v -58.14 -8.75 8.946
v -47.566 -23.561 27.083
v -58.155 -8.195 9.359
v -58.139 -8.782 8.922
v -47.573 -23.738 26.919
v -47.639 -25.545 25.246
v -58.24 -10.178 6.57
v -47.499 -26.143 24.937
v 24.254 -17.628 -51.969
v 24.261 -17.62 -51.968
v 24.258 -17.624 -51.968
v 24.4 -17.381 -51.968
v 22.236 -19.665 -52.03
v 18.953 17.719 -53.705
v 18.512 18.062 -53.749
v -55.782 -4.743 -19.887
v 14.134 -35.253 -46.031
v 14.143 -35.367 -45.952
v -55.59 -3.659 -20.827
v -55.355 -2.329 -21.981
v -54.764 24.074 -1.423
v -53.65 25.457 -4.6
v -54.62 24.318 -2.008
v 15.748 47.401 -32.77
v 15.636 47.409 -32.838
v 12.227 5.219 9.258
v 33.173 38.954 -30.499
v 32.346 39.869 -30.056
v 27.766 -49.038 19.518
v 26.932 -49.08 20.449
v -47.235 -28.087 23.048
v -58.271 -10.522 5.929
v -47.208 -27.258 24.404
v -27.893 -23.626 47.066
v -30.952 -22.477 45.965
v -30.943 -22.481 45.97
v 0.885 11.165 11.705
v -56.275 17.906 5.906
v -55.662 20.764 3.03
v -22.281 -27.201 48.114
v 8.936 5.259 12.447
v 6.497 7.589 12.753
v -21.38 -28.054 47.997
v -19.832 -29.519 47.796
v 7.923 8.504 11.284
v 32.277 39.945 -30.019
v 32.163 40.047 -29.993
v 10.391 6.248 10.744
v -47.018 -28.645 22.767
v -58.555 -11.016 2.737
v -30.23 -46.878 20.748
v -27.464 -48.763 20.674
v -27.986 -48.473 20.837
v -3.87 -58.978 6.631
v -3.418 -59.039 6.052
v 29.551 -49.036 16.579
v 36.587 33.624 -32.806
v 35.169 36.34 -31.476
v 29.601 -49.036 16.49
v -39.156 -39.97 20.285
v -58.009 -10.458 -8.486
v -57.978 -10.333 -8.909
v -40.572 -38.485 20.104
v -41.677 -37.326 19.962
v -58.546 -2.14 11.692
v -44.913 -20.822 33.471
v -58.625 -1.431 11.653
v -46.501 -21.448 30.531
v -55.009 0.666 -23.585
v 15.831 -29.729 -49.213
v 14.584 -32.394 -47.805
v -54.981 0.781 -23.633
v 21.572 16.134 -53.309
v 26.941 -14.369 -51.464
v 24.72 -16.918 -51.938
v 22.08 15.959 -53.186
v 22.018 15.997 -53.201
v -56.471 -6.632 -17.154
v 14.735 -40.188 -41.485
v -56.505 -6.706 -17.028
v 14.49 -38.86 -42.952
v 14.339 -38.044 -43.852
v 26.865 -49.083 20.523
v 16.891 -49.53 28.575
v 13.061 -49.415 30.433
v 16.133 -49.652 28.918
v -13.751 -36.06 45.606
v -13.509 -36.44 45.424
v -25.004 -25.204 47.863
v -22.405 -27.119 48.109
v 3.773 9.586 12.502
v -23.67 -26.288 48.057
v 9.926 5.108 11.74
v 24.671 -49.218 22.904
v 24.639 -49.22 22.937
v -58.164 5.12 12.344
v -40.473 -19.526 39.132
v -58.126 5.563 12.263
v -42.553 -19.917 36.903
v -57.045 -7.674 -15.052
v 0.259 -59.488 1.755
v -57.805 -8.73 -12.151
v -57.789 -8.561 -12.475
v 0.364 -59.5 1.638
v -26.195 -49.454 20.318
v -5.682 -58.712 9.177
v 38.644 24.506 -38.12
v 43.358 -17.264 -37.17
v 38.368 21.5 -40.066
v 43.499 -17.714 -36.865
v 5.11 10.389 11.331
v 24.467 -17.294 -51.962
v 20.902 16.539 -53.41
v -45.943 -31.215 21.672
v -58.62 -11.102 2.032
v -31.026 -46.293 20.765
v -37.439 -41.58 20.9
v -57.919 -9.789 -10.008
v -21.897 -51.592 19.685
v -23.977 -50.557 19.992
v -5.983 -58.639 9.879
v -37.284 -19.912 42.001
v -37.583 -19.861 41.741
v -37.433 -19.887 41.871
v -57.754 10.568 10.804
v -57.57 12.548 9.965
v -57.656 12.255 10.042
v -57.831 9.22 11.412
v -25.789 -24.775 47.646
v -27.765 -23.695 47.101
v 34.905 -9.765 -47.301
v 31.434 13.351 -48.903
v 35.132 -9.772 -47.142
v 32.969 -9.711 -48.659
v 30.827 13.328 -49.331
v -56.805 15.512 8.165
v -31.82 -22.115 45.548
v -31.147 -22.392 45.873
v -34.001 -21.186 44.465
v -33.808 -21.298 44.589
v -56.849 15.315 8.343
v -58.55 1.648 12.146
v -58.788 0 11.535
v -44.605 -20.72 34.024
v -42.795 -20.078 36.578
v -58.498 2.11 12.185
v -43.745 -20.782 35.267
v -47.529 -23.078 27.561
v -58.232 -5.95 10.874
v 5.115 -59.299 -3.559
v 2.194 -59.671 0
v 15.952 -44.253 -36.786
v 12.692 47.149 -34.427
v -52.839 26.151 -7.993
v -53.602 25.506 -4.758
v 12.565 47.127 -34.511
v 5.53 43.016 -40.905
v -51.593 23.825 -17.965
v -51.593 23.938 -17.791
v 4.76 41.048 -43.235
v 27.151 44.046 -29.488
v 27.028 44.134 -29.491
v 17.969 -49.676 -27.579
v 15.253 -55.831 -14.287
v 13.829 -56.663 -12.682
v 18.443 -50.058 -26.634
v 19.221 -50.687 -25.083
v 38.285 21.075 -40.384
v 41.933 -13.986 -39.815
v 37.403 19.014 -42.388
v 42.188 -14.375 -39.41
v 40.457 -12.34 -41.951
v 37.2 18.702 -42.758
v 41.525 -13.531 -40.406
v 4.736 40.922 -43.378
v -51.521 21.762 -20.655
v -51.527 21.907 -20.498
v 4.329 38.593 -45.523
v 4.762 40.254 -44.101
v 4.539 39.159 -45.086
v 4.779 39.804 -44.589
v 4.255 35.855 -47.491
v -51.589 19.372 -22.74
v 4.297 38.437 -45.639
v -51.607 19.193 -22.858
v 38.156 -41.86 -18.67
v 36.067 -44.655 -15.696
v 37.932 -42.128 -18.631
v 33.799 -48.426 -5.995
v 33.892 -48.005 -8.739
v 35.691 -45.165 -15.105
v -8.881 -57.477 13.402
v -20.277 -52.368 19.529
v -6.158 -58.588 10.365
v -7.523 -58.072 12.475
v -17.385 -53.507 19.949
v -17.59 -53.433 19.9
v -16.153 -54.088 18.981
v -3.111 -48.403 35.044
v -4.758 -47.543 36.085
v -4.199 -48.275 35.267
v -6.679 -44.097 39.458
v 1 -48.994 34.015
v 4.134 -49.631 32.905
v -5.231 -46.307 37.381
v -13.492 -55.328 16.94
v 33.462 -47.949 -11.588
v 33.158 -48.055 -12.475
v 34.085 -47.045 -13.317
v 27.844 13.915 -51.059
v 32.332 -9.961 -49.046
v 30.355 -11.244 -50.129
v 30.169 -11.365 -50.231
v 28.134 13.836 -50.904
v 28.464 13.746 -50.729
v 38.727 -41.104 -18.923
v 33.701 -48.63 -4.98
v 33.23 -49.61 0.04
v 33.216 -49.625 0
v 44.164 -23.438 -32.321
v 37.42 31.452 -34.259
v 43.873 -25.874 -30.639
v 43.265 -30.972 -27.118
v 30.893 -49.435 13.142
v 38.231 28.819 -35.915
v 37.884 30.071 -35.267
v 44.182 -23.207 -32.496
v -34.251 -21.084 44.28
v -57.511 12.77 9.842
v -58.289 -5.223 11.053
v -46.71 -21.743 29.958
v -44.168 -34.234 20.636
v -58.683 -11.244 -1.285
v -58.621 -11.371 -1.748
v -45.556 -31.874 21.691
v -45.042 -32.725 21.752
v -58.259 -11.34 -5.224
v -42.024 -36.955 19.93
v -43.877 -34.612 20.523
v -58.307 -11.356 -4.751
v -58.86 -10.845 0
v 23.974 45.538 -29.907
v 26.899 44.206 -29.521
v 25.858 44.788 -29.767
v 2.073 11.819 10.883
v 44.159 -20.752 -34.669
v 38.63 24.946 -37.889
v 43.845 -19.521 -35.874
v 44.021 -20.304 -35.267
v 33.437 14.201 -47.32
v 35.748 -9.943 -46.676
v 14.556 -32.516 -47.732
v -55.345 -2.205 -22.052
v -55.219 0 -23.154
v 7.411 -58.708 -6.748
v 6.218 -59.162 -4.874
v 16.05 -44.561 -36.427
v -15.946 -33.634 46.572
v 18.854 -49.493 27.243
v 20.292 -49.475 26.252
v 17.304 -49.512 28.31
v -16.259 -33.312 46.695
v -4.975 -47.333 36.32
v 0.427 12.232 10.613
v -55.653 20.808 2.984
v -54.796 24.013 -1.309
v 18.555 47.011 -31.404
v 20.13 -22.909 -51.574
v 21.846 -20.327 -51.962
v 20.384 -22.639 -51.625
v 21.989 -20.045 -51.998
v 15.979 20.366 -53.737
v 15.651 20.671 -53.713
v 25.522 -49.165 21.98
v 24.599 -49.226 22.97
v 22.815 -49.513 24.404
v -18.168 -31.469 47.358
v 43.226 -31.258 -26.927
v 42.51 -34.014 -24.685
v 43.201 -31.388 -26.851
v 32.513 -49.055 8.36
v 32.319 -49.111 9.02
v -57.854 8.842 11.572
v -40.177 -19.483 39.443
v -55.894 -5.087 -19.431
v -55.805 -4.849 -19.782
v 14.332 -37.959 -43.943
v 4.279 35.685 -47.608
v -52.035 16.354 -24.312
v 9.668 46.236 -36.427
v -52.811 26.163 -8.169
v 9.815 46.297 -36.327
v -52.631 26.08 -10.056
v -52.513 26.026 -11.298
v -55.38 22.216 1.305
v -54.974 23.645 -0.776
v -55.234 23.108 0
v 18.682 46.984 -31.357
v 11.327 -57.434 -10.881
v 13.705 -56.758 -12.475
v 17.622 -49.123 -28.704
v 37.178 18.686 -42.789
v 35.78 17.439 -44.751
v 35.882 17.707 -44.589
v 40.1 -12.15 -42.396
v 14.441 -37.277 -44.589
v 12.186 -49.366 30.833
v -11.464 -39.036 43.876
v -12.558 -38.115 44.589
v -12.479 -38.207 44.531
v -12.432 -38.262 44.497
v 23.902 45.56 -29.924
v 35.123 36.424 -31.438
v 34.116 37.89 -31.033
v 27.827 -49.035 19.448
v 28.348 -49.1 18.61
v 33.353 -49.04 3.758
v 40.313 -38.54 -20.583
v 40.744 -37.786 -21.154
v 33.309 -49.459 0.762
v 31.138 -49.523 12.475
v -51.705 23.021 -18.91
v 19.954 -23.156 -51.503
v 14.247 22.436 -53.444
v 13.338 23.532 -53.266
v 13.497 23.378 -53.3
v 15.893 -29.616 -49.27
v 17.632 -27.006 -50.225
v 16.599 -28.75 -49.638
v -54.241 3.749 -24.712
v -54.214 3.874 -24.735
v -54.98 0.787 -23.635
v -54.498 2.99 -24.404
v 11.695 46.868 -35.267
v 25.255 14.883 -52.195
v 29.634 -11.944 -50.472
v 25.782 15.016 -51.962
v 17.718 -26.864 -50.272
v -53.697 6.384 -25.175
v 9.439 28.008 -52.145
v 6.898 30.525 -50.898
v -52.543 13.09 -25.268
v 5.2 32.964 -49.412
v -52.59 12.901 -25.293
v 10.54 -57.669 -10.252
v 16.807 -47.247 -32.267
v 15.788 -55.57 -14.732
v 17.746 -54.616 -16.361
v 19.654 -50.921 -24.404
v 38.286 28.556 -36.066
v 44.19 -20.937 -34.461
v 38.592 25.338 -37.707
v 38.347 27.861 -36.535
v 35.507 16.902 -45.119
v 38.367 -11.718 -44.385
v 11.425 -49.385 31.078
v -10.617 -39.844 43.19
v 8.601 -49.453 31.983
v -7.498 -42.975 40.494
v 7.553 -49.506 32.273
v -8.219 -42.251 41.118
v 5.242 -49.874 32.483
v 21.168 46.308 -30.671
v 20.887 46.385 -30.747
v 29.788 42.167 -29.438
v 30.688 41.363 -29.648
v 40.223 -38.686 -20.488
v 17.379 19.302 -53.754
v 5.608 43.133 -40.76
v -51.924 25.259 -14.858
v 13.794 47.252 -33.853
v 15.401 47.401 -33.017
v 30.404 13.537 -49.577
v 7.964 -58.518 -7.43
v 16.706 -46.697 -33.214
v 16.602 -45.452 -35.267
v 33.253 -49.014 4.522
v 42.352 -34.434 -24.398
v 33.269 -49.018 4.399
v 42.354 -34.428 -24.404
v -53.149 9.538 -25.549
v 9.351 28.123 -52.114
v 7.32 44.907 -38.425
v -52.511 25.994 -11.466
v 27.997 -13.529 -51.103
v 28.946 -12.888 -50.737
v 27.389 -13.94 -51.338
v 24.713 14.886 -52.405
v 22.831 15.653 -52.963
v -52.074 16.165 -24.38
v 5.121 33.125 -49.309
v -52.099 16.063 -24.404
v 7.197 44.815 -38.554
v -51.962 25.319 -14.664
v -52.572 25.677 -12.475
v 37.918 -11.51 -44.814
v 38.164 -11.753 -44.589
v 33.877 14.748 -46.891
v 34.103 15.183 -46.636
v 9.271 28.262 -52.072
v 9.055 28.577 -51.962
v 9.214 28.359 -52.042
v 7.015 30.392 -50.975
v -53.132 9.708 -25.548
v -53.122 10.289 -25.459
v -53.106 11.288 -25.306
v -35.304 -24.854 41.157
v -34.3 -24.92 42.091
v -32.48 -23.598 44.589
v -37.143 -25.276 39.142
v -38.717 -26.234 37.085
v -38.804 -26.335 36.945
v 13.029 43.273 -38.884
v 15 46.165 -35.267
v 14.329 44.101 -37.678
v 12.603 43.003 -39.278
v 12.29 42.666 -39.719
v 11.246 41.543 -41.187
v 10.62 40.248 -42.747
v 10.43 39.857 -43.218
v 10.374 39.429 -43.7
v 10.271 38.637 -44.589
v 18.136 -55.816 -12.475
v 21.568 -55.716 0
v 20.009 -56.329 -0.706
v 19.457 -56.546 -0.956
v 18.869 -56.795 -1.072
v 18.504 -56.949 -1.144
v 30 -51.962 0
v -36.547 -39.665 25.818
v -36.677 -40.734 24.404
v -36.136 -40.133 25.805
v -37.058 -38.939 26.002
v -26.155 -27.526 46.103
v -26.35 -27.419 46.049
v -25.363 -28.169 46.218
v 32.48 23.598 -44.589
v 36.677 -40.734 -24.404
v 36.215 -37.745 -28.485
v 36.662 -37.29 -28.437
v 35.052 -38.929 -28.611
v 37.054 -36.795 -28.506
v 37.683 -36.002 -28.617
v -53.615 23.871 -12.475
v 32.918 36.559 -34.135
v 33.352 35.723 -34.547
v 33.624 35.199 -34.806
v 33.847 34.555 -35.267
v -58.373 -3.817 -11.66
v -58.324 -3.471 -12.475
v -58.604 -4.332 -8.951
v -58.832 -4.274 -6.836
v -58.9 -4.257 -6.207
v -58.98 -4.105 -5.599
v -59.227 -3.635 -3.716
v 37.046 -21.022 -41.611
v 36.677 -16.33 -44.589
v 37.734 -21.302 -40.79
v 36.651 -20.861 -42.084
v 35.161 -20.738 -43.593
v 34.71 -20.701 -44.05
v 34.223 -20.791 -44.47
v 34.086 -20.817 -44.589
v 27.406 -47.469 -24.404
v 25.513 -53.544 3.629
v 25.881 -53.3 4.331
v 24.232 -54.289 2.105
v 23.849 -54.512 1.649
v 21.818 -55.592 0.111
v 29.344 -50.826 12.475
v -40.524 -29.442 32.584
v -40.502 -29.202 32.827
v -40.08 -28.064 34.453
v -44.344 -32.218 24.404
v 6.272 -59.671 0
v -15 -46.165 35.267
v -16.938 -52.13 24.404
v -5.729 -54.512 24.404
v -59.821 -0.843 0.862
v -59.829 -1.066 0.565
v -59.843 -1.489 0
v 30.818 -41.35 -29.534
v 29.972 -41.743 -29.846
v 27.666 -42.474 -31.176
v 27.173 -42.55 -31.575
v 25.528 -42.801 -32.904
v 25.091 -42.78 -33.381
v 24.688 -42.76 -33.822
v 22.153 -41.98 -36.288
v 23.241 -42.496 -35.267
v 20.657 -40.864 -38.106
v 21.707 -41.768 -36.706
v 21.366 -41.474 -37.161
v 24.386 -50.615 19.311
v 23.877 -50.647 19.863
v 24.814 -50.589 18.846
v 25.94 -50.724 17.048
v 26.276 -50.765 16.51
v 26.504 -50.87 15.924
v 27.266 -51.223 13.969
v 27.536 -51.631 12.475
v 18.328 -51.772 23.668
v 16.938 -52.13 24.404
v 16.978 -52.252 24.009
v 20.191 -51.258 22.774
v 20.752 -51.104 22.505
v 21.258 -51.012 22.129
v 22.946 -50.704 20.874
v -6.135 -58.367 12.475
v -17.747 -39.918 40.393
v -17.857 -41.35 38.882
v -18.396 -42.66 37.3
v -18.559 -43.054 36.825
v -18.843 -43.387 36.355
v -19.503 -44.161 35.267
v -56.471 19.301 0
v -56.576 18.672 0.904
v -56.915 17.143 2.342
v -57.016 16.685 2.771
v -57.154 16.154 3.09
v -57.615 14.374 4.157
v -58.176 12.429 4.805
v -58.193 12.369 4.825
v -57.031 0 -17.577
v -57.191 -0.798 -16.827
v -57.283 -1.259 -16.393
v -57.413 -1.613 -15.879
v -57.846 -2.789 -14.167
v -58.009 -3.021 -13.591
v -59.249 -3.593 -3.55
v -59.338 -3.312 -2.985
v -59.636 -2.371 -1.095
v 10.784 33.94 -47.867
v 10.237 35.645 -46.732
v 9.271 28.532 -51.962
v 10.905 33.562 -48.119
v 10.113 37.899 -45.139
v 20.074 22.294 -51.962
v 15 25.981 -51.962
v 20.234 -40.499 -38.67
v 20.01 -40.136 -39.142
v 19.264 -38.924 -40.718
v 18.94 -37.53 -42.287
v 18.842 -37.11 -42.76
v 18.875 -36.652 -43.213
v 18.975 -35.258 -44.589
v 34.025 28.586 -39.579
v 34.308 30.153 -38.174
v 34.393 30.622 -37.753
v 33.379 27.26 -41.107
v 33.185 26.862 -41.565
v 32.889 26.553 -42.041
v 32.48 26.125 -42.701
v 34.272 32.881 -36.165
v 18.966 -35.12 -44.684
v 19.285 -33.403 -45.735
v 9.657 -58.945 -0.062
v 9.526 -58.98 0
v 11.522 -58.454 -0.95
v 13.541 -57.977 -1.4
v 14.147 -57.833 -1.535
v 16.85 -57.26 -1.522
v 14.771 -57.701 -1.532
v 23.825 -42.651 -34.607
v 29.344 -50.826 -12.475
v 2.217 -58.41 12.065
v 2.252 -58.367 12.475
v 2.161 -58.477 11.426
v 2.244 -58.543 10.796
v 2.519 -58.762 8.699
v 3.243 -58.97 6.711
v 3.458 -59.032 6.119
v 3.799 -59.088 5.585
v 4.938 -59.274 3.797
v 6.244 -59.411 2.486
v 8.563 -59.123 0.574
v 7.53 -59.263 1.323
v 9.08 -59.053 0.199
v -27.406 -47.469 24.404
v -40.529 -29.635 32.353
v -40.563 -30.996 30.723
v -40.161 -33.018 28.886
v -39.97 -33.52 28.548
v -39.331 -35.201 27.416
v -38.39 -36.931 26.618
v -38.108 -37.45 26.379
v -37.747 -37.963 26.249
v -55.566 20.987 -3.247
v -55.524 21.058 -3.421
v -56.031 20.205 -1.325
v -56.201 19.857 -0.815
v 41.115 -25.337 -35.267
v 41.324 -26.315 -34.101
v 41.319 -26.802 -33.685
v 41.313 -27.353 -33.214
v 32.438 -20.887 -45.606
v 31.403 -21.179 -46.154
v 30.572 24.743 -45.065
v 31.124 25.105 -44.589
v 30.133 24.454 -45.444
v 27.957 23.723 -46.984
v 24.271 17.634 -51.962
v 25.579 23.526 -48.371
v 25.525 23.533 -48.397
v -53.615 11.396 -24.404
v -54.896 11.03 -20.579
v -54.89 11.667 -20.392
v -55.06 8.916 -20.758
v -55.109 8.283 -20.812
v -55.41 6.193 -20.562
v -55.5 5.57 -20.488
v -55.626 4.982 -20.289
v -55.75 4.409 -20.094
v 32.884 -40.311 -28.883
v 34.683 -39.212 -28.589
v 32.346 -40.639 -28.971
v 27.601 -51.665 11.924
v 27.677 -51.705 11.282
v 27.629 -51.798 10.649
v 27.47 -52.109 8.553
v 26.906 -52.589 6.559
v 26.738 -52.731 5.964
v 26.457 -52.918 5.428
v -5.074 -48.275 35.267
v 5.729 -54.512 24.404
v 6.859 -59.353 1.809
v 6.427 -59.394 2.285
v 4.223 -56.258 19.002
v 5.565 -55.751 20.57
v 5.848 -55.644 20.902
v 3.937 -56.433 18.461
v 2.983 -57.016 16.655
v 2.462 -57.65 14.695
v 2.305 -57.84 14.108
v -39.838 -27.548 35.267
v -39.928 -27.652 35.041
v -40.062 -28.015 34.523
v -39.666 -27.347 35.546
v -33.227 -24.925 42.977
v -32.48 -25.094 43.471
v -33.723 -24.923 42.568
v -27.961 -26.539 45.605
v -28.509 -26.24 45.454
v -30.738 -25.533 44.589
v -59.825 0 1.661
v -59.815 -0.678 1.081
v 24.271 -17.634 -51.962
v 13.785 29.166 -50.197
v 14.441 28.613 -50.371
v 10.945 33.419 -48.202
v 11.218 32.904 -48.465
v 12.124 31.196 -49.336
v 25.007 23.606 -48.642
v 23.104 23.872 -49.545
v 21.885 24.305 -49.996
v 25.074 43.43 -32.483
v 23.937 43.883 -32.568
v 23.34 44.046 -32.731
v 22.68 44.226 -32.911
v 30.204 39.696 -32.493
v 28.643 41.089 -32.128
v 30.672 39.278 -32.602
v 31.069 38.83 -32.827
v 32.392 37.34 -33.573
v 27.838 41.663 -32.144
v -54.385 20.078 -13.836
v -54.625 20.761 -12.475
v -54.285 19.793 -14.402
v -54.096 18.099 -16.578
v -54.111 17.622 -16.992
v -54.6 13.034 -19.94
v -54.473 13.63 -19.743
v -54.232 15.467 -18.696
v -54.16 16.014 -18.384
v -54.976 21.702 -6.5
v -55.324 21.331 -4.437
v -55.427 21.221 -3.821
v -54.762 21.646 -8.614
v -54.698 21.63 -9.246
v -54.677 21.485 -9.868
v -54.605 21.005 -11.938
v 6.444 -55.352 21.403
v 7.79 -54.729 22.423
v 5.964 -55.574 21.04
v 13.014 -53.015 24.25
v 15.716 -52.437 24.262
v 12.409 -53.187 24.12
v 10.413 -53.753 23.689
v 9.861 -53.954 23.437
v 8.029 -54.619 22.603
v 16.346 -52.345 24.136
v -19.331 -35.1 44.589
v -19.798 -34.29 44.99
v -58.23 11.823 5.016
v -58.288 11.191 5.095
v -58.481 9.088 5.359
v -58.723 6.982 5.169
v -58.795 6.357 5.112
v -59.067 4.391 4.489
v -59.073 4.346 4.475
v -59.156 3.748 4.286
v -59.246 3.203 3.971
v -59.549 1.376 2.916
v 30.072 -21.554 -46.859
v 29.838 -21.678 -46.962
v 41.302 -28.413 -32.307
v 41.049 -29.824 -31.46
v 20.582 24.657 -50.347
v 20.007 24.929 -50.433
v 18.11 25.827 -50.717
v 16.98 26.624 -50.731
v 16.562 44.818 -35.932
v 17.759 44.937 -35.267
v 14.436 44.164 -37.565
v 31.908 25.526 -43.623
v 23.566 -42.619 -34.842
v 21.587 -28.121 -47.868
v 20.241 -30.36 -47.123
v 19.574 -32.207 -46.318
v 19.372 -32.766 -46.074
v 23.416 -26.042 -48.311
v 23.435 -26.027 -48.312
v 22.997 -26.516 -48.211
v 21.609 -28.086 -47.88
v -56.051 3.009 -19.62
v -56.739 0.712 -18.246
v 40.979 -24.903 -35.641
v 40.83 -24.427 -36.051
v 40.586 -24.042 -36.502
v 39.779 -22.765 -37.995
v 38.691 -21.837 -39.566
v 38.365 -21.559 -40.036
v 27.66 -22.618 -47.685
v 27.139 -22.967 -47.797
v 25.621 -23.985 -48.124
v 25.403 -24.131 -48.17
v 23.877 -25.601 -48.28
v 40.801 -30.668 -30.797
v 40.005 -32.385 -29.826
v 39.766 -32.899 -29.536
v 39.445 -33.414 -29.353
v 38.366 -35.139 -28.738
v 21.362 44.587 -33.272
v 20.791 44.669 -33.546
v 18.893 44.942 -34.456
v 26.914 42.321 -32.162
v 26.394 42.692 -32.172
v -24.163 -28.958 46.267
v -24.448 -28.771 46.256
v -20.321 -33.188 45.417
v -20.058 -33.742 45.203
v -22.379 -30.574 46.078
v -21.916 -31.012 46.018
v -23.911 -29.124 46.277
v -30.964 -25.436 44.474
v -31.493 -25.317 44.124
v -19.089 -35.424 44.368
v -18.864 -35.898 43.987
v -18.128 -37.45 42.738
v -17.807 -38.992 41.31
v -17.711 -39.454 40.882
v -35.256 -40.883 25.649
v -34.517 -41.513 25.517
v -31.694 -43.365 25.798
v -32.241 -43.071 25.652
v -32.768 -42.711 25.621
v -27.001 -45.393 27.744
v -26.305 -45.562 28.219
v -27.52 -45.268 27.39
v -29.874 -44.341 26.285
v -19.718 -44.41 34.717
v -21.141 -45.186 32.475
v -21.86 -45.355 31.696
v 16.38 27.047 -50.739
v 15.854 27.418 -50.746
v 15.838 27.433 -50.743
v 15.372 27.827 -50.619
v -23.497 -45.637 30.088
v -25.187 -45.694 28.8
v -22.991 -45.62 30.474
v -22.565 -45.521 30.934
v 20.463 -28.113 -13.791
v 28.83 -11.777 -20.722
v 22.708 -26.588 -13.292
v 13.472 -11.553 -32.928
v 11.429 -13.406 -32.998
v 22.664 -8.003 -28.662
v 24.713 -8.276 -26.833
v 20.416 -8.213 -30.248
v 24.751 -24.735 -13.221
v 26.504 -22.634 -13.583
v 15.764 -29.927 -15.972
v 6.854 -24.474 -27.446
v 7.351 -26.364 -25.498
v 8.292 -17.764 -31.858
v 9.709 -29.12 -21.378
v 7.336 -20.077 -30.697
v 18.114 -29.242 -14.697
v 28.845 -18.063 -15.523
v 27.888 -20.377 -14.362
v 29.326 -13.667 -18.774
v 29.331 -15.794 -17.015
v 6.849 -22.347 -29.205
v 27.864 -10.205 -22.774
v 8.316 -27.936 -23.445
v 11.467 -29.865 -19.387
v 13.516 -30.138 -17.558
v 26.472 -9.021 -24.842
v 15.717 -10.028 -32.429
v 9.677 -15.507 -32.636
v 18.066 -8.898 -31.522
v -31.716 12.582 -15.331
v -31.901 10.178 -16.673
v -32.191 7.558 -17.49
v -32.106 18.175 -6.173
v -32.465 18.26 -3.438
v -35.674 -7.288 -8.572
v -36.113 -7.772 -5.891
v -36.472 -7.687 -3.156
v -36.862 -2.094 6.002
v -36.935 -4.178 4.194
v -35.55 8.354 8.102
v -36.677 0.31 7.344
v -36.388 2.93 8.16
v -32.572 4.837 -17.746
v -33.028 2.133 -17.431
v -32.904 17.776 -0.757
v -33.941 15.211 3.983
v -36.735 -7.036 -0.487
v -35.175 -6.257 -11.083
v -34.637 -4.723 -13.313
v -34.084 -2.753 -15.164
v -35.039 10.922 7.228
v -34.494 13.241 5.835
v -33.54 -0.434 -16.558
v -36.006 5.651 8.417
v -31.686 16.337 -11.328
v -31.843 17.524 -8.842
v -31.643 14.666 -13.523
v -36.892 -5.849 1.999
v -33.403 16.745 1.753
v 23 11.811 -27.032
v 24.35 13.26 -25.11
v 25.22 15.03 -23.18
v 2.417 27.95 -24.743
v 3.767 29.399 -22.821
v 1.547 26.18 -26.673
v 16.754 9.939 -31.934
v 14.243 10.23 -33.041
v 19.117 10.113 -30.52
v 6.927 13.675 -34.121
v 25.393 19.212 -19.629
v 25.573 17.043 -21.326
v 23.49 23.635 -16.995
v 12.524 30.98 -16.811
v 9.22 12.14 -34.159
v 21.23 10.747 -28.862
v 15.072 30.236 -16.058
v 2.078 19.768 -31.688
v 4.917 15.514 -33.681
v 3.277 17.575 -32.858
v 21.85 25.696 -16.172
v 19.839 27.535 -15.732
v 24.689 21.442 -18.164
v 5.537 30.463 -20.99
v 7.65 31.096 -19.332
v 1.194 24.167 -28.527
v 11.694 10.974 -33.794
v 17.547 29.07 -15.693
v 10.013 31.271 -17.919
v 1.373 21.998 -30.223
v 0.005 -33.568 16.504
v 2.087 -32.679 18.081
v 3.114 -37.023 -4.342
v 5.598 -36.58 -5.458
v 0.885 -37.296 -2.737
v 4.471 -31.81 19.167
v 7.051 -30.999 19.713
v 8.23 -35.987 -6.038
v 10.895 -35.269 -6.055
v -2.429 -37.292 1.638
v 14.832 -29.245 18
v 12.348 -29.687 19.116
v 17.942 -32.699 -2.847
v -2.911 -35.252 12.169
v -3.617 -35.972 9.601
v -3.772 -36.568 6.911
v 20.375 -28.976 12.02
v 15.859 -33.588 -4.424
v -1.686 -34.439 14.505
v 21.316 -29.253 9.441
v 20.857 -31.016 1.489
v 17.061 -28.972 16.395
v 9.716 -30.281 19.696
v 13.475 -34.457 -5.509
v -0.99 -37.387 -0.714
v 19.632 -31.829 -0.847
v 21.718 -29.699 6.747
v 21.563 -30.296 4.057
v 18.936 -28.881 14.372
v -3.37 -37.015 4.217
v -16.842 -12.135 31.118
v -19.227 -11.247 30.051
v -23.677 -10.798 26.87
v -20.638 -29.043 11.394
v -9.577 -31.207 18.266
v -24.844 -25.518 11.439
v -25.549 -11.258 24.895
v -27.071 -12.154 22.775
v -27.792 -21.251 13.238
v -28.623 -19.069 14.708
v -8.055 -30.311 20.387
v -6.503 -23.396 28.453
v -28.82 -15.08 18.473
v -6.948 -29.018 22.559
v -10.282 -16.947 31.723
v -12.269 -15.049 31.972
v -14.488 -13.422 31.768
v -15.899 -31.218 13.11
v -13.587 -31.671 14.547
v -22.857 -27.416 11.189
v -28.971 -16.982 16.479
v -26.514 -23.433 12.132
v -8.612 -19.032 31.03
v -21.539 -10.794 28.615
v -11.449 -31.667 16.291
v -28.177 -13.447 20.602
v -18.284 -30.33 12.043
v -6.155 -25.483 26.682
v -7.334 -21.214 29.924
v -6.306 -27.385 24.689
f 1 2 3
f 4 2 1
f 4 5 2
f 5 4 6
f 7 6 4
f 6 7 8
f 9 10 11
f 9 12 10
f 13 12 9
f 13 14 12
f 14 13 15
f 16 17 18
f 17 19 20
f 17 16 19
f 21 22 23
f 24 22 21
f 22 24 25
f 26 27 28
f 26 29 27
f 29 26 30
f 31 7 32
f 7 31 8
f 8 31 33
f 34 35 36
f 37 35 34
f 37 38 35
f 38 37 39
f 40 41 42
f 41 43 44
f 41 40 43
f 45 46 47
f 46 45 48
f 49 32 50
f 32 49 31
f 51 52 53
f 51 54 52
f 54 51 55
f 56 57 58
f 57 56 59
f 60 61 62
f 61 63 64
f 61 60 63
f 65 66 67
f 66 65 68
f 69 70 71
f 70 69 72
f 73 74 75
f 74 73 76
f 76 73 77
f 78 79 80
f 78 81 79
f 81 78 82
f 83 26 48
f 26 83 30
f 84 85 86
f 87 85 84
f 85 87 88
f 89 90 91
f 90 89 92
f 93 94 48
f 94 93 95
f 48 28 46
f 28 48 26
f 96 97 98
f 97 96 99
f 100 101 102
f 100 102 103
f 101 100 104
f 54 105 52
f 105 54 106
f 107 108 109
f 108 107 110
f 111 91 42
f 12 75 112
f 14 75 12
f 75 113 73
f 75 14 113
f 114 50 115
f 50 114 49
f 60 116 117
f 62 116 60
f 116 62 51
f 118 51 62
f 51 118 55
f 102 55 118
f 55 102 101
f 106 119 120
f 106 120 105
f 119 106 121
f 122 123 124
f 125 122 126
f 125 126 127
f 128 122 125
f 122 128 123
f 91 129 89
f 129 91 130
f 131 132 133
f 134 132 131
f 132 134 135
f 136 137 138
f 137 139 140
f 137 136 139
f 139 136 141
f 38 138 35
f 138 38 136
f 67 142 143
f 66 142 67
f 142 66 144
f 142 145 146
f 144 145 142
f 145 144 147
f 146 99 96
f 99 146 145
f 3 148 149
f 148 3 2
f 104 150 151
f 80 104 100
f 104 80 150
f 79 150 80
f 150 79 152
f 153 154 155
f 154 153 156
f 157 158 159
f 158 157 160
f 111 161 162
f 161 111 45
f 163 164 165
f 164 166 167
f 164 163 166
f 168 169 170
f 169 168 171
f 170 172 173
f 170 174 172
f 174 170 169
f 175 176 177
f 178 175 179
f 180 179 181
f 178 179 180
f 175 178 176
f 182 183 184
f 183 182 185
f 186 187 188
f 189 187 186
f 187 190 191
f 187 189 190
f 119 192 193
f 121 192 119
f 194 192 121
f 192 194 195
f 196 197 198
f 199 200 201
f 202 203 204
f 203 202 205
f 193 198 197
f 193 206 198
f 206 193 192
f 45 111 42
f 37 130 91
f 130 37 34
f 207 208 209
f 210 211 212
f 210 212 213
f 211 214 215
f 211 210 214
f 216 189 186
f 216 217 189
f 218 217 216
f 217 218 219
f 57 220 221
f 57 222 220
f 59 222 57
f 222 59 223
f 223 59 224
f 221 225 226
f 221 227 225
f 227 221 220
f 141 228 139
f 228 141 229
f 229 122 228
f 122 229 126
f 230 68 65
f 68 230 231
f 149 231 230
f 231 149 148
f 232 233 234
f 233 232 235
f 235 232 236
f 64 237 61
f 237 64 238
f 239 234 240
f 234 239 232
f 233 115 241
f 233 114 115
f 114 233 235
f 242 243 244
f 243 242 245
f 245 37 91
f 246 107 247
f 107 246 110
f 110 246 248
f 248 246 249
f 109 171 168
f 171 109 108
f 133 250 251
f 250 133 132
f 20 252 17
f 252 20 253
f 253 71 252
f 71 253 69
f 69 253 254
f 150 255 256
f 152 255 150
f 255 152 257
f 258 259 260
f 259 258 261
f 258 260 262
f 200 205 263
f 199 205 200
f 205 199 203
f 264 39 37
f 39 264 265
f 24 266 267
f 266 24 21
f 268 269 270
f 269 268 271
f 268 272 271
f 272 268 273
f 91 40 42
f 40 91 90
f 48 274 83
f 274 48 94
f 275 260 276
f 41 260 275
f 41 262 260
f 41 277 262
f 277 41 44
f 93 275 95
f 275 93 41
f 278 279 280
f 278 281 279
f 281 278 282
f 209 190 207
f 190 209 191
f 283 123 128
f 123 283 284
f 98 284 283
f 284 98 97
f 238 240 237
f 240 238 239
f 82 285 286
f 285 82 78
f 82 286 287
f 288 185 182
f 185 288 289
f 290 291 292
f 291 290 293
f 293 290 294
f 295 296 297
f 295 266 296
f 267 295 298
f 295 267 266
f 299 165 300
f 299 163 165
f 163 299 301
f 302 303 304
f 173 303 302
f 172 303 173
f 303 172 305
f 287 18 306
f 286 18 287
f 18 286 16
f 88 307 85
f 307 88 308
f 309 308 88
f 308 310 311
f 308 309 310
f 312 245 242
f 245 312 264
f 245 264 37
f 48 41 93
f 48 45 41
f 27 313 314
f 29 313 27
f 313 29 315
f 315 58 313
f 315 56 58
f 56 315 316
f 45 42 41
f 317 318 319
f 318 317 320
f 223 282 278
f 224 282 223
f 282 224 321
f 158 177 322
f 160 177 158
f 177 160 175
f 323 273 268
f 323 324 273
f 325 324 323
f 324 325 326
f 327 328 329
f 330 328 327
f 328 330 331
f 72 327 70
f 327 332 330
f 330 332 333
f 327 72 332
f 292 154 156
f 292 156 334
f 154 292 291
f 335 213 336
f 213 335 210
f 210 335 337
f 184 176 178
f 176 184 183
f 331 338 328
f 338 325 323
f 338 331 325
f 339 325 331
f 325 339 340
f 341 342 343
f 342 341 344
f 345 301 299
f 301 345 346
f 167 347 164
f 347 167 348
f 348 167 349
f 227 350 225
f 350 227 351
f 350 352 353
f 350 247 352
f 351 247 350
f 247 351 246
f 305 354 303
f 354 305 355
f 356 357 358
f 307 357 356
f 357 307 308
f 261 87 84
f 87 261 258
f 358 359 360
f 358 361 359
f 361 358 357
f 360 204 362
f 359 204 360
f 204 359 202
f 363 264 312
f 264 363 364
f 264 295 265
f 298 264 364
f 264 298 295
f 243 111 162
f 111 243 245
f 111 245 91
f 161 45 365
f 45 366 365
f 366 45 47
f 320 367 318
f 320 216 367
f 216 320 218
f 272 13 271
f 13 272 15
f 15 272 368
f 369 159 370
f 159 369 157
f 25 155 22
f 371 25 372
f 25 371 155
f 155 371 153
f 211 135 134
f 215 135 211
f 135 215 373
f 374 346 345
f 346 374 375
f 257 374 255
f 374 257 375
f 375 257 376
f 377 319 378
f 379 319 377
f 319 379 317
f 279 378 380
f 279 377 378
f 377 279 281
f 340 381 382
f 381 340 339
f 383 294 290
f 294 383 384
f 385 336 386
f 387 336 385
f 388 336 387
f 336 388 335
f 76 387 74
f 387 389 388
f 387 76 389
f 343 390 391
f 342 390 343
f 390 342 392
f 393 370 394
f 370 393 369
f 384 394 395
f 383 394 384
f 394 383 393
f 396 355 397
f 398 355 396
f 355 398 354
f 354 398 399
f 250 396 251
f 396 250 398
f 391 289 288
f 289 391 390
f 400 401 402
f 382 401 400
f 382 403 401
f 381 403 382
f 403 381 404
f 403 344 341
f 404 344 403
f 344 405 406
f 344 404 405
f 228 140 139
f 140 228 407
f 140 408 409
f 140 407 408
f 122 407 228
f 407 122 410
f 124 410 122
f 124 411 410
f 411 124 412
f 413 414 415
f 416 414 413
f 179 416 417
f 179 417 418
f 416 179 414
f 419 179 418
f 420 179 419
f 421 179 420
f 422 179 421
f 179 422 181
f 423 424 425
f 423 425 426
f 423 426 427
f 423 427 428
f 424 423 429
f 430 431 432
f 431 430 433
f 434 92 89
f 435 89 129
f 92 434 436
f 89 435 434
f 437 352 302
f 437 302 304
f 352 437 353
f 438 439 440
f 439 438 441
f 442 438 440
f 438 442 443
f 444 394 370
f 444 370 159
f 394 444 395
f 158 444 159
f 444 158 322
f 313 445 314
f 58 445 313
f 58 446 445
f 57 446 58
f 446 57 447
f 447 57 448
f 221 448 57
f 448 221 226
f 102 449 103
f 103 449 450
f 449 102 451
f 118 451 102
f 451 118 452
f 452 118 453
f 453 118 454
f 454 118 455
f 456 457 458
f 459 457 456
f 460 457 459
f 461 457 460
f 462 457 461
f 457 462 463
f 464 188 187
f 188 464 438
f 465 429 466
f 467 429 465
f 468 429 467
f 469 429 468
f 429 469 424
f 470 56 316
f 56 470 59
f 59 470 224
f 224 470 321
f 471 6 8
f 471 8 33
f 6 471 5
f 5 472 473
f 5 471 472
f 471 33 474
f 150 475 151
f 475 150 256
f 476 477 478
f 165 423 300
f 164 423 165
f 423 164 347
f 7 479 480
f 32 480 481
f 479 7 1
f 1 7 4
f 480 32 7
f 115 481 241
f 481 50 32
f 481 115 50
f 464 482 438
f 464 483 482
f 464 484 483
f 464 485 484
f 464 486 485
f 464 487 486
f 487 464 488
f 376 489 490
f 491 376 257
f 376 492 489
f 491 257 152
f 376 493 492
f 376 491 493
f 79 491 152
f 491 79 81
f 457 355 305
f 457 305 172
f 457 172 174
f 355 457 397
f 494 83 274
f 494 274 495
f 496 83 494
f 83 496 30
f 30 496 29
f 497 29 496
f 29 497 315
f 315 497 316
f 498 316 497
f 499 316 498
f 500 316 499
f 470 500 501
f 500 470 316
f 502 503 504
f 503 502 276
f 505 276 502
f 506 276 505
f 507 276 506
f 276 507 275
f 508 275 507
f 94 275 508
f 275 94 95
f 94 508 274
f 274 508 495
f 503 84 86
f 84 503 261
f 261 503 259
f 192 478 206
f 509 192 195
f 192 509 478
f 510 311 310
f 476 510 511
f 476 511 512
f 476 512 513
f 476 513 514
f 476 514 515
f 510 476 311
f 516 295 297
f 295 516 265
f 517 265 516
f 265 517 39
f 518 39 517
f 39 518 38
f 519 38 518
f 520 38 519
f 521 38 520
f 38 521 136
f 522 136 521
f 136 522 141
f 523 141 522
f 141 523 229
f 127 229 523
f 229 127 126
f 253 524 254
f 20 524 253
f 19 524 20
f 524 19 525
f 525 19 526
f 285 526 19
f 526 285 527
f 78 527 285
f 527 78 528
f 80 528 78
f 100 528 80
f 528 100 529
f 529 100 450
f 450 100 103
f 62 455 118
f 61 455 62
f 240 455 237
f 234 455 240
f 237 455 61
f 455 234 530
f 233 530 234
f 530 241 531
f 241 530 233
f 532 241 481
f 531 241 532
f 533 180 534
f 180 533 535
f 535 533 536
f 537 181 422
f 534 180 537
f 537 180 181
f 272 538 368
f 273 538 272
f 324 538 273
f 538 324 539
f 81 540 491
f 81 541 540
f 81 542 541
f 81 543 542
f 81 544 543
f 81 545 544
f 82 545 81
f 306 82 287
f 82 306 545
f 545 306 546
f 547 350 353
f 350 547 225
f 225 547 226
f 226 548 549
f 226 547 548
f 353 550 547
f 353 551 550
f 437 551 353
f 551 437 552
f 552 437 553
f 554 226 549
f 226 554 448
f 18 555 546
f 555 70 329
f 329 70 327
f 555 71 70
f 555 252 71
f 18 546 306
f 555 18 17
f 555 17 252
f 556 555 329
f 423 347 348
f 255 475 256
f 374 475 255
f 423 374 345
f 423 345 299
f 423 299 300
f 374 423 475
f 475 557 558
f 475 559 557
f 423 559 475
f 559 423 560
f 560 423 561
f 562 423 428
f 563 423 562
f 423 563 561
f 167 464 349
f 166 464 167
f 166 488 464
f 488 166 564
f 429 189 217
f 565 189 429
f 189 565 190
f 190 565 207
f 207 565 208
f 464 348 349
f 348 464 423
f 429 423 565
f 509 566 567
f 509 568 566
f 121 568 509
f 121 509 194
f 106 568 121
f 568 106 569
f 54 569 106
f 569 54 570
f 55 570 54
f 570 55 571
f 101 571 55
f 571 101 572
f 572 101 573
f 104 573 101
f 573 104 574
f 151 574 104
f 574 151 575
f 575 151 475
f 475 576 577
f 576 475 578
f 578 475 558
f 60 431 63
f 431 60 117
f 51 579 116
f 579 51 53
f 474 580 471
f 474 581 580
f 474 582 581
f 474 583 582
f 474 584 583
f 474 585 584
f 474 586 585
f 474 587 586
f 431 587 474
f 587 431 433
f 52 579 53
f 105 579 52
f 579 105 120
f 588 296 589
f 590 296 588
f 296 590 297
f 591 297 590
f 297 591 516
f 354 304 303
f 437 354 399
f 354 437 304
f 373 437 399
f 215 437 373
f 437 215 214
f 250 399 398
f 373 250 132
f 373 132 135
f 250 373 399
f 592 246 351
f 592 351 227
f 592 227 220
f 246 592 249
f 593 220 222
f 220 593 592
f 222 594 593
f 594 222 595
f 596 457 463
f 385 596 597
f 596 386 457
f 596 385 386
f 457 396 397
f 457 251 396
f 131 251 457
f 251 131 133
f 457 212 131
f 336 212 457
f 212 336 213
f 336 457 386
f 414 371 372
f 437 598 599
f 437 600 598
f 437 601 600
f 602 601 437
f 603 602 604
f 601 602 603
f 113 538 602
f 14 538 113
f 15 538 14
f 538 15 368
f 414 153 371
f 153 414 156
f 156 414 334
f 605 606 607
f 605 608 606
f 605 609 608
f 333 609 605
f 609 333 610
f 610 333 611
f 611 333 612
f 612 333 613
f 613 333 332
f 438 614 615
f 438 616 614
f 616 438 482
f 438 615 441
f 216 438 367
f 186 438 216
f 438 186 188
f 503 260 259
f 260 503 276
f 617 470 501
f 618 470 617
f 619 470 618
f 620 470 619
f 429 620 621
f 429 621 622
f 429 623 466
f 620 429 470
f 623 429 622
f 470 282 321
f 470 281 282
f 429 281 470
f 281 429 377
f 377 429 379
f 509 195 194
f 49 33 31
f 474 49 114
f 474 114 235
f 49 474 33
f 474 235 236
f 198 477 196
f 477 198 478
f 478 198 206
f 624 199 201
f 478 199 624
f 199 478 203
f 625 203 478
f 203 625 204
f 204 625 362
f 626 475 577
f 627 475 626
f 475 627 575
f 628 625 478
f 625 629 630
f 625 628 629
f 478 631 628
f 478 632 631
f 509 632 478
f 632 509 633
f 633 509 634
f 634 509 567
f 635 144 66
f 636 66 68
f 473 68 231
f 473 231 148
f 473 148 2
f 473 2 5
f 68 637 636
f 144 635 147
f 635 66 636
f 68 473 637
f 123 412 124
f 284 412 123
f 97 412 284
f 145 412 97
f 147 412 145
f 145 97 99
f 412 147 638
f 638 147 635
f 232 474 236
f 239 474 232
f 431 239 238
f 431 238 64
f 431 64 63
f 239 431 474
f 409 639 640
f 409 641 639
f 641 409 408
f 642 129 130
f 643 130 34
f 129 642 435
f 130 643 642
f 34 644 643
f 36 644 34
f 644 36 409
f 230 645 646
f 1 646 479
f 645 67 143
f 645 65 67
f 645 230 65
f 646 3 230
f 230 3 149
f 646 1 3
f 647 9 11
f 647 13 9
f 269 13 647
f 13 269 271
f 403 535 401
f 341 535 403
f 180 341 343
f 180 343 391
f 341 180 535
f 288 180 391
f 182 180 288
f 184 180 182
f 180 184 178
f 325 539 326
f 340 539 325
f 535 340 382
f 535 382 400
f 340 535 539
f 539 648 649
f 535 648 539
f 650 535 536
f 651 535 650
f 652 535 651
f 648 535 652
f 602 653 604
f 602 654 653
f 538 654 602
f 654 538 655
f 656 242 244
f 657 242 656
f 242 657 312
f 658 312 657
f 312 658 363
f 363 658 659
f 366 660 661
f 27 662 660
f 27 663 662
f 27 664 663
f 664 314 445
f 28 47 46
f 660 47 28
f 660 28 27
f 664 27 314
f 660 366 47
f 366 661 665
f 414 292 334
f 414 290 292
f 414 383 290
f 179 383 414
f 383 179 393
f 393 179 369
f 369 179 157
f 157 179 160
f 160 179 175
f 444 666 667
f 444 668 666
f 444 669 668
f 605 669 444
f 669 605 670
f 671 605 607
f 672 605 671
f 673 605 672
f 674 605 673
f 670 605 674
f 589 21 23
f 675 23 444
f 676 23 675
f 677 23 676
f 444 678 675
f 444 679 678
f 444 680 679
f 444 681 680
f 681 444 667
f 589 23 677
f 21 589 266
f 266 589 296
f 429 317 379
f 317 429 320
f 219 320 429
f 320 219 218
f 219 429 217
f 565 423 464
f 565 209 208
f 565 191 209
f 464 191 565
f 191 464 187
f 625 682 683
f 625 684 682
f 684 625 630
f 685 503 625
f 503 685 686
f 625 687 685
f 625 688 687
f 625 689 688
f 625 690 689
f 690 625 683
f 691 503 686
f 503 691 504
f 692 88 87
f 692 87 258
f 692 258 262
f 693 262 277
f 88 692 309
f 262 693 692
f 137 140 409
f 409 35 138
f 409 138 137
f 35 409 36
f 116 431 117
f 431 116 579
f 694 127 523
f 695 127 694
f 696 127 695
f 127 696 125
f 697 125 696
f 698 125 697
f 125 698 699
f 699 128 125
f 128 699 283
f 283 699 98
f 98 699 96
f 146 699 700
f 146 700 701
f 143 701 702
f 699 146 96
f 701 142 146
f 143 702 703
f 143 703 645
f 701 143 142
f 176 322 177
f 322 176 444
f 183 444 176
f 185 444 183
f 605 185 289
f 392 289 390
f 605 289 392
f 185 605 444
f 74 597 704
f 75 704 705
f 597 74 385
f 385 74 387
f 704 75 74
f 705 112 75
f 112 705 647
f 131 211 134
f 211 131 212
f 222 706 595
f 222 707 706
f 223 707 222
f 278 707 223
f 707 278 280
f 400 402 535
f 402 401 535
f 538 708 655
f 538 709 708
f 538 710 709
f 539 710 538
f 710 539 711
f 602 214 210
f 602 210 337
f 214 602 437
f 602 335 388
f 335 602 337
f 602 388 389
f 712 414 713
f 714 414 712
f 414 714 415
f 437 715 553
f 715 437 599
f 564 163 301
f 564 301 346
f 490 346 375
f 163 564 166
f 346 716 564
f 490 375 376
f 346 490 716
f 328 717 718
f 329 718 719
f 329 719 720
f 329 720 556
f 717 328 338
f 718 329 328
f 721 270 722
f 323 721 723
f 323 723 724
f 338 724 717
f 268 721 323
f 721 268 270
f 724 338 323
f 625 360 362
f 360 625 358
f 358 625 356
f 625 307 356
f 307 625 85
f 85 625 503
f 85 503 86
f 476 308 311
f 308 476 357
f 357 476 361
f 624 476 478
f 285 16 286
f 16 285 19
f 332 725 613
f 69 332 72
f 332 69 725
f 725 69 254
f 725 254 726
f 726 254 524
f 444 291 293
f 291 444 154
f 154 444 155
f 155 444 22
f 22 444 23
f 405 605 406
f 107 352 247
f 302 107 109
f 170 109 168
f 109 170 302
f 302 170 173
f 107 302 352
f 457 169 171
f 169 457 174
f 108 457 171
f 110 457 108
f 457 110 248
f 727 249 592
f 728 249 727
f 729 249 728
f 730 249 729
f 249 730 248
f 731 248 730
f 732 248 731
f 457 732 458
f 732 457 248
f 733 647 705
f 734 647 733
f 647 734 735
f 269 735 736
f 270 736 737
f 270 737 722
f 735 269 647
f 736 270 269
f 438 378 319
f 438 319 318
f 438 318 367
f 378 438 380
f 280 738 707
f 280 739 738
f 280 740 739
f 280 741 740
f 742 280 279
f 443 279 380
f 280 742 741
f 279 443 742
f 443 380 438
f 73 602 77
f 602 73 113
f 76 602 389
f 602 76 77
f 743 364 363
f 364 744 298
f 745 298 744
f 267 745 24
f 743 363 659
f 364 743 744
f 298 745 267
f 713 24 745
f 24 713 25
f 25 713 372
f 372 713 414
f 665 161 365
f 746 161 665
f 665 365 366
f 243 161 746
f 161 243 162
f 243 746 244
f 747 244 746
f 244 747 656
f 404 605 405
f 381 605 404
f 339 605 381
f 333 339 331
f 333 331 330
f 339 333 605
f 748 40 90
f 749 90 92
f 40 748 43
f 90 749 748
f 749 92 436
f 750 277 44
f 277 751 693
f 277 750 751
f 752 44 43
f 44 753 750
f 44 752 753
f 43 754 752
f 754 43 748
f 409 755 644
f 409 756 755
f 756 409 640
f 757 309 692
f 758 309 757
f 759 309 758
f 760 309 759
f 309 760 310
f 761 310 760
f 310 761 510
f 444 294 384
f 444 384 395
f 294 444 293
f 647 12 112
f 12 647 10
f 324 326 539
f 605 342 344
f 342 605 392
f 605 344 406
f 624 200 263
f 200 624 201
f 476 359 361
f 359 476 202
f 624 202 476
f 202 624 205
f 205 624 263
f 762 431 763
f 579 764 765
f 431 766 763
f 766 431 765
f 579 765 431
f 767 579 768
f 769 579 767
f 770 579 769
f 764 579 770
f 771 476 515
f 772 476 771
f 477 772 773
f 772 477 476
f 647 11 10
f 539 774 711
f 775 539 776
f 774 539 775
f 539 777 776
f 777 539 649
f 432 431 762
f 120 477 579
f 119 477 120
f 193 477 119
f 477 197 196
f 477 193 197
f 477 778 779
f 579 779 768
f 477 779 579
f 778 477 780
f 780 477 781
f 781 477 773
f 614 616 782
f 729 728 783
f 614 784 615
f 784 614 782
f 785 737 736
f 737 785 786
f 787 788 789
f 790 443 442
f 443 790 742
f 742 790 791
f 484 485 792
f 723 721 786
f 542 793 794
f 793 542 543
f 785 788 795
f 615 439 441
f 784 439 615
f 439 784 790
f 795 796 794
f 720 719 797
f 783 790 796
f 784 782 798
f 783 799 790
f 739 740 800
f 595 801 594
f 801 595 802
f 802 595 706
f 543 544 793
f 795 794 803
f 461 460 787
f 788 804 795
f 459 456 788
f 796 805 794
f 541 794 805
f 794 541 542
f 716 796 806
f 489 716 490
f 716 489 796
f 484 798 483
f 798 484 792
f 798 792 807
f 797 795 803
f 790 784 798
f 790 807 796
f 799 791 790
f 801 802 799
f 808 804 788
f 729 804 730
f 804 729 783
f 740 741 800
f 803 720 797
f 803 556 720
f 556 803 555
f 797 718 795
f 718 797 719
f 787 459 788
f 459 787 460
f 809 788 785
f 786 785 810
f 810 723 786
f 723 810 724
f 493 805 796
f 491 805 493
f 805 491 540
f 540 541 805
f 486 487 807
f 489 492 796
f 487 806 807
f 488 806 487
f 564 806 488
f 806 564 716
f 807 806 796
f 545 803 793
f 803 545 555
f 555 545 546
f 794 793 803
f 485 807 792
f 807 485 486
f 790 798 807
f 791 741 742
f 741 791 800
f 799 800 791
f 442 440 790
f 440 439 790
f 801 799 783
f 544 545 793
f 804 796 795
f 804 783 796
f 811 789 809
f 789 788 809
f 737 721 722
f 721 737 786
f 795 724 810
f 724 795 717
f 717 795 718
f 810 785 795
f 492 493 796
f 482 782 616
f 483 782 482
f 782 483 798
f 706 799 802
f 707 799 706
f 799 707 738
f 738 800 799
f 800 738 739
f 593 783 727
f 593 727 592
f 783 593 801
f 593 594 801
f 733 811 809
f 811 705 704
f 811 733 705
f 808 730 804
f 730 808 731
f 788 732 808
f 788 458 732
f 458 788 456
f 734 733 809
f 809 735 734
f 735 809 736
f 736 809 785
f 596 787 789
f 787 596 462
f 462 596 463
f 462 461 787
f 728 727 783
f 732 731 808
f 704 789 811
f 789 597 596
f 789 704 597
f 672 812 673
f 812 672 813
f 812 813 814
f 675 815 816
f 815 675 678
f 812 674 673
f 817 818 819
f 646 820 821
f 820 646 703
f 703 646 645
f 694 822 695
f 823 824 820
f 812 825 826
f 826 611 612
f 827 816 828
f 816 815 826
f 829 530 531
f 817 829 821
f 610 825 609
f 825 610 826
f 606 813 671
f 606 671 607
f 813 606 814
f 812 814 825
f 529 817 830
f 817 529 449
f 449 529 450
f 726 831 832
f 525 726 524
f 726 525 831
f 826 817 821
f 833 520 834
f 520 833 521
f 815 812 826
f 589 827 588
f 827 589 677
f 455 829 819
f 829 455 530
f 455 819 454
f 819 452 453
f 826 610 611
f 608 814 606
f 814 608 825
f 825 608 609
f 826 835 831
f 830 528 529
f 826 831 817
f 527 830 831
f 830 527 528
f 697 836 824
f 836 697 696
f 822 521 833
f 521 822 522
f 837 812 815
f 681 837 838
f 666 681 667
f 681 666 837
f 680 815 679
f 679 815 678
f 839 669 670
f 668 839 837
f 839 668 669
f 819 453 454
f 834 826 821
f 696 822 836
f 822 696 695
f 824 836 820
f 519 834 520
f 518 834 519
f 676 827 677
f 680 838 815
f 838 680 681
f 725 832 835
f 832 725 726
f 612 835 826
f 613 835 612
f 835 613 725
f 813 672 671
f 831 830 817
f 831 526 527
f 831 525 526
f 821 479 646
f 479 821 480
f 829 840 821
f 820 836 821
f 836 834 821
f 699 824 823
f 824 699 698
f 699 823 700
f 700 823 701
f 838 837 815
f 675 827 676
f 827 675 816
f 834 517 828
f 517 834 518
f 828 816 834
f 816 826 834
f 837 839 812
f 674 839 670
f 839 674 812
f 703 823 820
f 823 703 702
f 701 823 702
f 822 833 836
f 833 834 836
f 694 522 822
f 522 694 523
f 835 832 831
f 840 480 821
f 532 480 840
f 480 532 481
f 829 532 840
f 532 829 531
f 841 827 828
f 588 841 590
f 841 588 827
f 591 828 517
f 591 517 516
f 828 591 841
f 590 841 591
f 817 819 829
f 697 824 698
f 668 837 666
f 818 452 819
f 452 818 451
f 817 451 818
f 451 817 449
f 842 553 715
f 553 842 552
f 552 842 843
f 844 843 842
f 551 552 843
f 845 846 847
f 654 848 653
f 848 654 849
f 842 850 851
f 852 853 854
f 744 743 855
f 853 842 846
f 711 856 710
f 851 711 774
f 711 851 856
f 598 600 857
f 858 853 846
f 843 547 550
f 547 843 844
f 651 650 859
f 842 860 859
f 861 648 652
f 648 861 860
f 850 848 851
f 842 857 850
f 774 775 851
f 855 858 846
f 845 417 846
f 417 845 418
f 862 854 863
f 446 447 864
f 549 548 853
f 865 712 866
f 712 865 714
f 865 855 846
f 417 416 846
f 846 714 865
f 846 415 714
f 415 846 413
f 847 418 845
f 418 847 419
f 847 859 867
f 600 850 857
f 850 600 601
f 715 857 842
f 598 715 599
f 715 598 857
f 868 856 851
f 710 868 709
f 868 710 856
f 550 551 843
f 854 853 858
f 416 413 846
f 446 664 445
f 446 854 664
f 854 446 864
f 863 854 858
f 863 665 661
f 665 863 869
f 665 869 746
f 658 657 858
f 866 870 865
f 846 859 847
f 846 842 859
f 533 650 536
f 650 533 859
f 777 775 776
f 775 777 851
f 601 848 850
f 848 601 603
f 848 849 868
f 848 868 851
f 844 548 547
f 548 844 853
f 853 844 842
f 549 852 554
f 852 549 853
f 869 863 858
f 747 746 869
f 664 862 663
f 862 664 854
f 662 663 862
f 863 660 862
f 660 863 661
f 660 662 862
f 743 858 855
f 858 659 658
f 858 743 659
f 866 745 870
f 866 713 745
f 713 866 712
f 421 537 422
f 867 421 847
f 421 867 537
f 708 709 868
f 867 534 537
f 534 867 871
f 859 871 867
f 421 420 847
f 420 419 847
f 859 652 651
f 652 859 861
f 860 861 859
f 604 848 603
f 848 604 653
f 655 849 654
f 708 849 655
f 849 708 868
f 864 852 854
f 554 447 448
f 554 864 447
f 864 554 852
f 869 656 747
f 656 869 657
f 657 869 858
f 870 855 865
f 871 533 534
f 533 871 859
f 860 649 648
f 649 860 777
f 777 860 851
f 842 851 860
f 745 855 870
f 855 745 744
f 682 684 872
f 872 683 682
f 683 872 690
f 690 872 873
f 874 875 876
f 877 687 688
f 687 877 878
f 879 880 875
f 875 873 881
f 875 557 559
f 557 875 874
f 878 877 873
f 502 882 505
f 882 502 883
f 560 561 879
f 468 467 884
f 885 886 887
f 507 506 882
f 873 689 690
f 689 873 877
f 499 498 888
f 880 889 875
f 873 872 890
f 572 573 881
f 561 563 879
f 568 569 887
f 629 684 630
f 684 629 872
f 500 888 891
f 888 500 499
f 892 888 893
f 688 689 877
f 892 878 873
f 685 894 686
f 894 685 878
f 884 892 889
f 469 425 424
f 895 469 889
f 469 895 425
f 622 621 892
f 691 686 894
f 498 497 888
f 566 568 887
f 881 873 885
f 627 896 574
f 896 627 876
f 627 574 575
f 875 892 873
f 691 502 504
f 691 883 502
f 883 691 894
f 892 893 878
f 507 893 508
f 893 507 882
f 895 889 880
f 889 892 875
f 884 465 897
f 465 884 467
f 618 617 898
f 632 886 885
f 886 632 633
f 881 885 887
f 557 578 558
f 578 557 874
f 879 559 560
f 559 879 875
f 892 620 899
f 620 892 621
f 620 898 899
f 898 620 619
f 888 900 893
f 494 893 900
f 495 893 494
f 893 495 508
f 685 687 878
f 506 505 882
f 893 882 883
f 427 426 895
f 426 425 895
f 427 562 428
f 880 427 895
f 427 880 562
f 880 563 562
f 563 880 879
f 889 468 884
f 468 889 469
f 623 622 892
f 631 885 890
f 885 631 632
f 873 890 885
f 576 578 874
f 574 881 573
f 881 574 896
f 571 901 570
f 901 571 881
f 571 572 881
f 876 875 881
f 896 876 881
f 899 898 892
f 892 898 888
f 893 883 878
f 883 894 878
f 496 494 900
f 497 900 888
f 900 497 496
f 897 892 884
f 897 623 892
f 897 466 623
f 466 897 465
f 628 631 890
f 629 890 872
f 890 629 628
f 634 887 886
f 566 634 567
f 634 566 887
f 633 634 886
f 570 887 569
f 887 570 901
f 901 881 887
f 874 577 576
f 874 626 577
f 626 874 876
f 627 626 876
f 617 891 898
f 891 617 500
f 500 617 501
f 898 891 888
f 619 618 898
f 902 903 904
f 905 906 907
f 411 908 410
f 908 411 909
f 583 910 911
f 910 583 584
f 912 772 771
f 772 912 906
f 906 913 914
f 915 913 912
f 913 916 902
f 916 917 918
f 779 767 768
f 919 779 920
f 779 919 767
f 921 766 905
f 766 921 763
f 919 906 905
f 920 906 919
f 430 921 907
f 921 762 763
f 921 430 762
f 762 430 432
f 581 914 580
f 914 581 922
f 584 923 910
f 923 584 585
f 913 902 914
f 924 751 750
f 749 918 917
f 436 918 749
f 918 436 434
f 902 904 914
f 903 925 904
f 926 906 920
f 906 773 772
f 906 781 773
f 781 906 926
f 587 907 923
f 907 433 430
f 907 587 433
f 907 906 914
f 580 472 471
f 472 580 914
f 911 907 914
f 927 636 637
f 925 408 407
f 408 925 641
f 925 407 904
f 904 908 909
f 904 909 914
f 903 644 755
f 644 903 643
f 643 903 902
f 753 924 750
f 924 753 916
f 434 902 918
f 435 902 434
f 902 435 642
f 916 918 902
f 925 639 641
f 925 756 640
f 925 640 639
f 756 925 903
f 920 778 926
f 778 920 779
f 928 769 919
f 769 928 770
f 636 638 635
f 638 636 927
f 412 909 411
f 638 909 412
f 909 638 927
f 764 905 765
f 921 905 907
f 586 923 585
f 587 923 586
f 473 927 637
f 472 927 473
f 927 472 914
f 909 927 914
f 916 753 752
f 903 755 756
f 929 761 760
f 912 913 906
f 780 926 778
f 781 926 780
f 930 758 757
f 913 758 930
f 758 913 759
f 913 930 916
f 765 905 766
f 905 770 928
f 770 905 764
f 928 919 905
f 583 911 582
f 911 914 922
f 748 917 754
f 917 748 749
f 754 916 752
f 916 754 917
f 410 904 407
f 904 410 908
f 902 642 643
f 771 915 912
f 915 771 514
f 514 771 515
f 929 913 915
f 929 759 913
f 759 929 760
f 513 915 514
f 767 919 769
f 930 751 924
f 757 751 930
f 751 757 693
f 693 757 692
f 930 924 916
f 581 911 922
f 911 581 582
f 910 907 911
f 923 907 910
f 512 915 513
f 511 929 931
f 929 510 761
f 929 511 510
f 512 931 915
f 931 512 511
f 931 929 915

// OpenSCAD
difference() {
	intersection() {
		hull() {
			rotate(a = -121.8002487075, v = [0.8264841997, -0.1980847523, 0.0000000000]) {
				rotate(a = -90.0000000000, v = [0.6087614290, -0.7933533403, 0.0000000000]) {
					cylinder(h = 60, r = 16.2000000000);
				}
			}
			rotate(a = -121.8002487075, v = [0.8264841997, -0.1980847523, 0.0000000000]) {
				rotate(a = -90.0000000000, v = [0.3826834324, 0.9238795325, -0.0000000000]) {
					cylinder(h = 60, r = 16.2000000000);
				}
			}
			rotate(a = -121.8002487075, v = [0.8264841997, -0.1980847523, 0.0000000000]) {
				rotate(a = -20.3482733305, v = [0.1948712799, -0.2879902172, 0.0000000000]) {
					cylinder(h = 60, r = 16.2000000000);
				}
			}
			rotate(a = -121.8002487075, v = [0.8264841997, -0.1980847523, 0.0000000000]) {
				rotate(a = -146.5585275075, v = [0.1703523564, -0.5240940995, 0.0000000000]) {
					cylinder(h = 60, r = 16.2000000000);
				}
			}
			rotate(a = -121.8002487075, v = [0.8264841997, -0.1980847523, 0.0000000000]) {
				rotate(a = -157.7736717199, v = [-0.0665799897, 0.3723606073, 0.0000000000]) {
					cylinder(h = 60, r = 16.2000000000);
				}
			}
		}
		sphere(r = 60);
	}
	union() {
		rotate(a = -121.8002487075, v = [0.8264841997, -0.1980847523, 0.0000000000]) {
			rotate(a = -90.0000000000, v = [0.6087614290, -0.7933533403, 0.0000000000]) {
				translate(v = [0, 0, 35]) {
					cylinder(h = 100, r = 13.2000000000);
				}
			}
		}
		rotate(a = -121.8002487075, v = [0.8264841997, -0.1980847523, 0.0000000000]) {
			rotate(a = -90.0000000000, v = [0.3826834324, 0.9238795325, -0.0000000000]) {
				translate(v = [0, 0, 35]) {
					cylinder(h = 100, r = 13.2000000000);
				}
			}
		}
		rotate(a = -121.8002487075, v = [0.8264841997, -0.1980847523, 0.0000000000]) {
			rotate(a = -20.3482733305, v = [0.1948712799, -0.2879902172, 0.0000000000]) {
				translate(v = [0, 0, 35]) {
					cylinder(h = 100, r = 13.2000000000);
				}
			}
		}
		rotate(a = -121.8002487075, v = [0.8264841997, -0.1980847523, 0.0000000000]) {
			rotate(a = -146.5585275075, v = [0.1703523564, -0.5240940995, 0.0000000000]) {
				translate(v = [0, 0, 35]) {
					cylinder(h = 100, r = 13.2000000000);
				}
			}
		}
		rotate(a = -121.8002487075, v = [0.8264841997, -0.1980847523, 0.0000000000]) {
			rotate(a = -157.7736717199, v = [-0.0665799897, 0.3723606073, 0.0000000000]) {
				translate(v = [0, 0, 35]) {
					cylinder(h = 100, r = 13.2000000000);
				}
			}
		}
	}
}
